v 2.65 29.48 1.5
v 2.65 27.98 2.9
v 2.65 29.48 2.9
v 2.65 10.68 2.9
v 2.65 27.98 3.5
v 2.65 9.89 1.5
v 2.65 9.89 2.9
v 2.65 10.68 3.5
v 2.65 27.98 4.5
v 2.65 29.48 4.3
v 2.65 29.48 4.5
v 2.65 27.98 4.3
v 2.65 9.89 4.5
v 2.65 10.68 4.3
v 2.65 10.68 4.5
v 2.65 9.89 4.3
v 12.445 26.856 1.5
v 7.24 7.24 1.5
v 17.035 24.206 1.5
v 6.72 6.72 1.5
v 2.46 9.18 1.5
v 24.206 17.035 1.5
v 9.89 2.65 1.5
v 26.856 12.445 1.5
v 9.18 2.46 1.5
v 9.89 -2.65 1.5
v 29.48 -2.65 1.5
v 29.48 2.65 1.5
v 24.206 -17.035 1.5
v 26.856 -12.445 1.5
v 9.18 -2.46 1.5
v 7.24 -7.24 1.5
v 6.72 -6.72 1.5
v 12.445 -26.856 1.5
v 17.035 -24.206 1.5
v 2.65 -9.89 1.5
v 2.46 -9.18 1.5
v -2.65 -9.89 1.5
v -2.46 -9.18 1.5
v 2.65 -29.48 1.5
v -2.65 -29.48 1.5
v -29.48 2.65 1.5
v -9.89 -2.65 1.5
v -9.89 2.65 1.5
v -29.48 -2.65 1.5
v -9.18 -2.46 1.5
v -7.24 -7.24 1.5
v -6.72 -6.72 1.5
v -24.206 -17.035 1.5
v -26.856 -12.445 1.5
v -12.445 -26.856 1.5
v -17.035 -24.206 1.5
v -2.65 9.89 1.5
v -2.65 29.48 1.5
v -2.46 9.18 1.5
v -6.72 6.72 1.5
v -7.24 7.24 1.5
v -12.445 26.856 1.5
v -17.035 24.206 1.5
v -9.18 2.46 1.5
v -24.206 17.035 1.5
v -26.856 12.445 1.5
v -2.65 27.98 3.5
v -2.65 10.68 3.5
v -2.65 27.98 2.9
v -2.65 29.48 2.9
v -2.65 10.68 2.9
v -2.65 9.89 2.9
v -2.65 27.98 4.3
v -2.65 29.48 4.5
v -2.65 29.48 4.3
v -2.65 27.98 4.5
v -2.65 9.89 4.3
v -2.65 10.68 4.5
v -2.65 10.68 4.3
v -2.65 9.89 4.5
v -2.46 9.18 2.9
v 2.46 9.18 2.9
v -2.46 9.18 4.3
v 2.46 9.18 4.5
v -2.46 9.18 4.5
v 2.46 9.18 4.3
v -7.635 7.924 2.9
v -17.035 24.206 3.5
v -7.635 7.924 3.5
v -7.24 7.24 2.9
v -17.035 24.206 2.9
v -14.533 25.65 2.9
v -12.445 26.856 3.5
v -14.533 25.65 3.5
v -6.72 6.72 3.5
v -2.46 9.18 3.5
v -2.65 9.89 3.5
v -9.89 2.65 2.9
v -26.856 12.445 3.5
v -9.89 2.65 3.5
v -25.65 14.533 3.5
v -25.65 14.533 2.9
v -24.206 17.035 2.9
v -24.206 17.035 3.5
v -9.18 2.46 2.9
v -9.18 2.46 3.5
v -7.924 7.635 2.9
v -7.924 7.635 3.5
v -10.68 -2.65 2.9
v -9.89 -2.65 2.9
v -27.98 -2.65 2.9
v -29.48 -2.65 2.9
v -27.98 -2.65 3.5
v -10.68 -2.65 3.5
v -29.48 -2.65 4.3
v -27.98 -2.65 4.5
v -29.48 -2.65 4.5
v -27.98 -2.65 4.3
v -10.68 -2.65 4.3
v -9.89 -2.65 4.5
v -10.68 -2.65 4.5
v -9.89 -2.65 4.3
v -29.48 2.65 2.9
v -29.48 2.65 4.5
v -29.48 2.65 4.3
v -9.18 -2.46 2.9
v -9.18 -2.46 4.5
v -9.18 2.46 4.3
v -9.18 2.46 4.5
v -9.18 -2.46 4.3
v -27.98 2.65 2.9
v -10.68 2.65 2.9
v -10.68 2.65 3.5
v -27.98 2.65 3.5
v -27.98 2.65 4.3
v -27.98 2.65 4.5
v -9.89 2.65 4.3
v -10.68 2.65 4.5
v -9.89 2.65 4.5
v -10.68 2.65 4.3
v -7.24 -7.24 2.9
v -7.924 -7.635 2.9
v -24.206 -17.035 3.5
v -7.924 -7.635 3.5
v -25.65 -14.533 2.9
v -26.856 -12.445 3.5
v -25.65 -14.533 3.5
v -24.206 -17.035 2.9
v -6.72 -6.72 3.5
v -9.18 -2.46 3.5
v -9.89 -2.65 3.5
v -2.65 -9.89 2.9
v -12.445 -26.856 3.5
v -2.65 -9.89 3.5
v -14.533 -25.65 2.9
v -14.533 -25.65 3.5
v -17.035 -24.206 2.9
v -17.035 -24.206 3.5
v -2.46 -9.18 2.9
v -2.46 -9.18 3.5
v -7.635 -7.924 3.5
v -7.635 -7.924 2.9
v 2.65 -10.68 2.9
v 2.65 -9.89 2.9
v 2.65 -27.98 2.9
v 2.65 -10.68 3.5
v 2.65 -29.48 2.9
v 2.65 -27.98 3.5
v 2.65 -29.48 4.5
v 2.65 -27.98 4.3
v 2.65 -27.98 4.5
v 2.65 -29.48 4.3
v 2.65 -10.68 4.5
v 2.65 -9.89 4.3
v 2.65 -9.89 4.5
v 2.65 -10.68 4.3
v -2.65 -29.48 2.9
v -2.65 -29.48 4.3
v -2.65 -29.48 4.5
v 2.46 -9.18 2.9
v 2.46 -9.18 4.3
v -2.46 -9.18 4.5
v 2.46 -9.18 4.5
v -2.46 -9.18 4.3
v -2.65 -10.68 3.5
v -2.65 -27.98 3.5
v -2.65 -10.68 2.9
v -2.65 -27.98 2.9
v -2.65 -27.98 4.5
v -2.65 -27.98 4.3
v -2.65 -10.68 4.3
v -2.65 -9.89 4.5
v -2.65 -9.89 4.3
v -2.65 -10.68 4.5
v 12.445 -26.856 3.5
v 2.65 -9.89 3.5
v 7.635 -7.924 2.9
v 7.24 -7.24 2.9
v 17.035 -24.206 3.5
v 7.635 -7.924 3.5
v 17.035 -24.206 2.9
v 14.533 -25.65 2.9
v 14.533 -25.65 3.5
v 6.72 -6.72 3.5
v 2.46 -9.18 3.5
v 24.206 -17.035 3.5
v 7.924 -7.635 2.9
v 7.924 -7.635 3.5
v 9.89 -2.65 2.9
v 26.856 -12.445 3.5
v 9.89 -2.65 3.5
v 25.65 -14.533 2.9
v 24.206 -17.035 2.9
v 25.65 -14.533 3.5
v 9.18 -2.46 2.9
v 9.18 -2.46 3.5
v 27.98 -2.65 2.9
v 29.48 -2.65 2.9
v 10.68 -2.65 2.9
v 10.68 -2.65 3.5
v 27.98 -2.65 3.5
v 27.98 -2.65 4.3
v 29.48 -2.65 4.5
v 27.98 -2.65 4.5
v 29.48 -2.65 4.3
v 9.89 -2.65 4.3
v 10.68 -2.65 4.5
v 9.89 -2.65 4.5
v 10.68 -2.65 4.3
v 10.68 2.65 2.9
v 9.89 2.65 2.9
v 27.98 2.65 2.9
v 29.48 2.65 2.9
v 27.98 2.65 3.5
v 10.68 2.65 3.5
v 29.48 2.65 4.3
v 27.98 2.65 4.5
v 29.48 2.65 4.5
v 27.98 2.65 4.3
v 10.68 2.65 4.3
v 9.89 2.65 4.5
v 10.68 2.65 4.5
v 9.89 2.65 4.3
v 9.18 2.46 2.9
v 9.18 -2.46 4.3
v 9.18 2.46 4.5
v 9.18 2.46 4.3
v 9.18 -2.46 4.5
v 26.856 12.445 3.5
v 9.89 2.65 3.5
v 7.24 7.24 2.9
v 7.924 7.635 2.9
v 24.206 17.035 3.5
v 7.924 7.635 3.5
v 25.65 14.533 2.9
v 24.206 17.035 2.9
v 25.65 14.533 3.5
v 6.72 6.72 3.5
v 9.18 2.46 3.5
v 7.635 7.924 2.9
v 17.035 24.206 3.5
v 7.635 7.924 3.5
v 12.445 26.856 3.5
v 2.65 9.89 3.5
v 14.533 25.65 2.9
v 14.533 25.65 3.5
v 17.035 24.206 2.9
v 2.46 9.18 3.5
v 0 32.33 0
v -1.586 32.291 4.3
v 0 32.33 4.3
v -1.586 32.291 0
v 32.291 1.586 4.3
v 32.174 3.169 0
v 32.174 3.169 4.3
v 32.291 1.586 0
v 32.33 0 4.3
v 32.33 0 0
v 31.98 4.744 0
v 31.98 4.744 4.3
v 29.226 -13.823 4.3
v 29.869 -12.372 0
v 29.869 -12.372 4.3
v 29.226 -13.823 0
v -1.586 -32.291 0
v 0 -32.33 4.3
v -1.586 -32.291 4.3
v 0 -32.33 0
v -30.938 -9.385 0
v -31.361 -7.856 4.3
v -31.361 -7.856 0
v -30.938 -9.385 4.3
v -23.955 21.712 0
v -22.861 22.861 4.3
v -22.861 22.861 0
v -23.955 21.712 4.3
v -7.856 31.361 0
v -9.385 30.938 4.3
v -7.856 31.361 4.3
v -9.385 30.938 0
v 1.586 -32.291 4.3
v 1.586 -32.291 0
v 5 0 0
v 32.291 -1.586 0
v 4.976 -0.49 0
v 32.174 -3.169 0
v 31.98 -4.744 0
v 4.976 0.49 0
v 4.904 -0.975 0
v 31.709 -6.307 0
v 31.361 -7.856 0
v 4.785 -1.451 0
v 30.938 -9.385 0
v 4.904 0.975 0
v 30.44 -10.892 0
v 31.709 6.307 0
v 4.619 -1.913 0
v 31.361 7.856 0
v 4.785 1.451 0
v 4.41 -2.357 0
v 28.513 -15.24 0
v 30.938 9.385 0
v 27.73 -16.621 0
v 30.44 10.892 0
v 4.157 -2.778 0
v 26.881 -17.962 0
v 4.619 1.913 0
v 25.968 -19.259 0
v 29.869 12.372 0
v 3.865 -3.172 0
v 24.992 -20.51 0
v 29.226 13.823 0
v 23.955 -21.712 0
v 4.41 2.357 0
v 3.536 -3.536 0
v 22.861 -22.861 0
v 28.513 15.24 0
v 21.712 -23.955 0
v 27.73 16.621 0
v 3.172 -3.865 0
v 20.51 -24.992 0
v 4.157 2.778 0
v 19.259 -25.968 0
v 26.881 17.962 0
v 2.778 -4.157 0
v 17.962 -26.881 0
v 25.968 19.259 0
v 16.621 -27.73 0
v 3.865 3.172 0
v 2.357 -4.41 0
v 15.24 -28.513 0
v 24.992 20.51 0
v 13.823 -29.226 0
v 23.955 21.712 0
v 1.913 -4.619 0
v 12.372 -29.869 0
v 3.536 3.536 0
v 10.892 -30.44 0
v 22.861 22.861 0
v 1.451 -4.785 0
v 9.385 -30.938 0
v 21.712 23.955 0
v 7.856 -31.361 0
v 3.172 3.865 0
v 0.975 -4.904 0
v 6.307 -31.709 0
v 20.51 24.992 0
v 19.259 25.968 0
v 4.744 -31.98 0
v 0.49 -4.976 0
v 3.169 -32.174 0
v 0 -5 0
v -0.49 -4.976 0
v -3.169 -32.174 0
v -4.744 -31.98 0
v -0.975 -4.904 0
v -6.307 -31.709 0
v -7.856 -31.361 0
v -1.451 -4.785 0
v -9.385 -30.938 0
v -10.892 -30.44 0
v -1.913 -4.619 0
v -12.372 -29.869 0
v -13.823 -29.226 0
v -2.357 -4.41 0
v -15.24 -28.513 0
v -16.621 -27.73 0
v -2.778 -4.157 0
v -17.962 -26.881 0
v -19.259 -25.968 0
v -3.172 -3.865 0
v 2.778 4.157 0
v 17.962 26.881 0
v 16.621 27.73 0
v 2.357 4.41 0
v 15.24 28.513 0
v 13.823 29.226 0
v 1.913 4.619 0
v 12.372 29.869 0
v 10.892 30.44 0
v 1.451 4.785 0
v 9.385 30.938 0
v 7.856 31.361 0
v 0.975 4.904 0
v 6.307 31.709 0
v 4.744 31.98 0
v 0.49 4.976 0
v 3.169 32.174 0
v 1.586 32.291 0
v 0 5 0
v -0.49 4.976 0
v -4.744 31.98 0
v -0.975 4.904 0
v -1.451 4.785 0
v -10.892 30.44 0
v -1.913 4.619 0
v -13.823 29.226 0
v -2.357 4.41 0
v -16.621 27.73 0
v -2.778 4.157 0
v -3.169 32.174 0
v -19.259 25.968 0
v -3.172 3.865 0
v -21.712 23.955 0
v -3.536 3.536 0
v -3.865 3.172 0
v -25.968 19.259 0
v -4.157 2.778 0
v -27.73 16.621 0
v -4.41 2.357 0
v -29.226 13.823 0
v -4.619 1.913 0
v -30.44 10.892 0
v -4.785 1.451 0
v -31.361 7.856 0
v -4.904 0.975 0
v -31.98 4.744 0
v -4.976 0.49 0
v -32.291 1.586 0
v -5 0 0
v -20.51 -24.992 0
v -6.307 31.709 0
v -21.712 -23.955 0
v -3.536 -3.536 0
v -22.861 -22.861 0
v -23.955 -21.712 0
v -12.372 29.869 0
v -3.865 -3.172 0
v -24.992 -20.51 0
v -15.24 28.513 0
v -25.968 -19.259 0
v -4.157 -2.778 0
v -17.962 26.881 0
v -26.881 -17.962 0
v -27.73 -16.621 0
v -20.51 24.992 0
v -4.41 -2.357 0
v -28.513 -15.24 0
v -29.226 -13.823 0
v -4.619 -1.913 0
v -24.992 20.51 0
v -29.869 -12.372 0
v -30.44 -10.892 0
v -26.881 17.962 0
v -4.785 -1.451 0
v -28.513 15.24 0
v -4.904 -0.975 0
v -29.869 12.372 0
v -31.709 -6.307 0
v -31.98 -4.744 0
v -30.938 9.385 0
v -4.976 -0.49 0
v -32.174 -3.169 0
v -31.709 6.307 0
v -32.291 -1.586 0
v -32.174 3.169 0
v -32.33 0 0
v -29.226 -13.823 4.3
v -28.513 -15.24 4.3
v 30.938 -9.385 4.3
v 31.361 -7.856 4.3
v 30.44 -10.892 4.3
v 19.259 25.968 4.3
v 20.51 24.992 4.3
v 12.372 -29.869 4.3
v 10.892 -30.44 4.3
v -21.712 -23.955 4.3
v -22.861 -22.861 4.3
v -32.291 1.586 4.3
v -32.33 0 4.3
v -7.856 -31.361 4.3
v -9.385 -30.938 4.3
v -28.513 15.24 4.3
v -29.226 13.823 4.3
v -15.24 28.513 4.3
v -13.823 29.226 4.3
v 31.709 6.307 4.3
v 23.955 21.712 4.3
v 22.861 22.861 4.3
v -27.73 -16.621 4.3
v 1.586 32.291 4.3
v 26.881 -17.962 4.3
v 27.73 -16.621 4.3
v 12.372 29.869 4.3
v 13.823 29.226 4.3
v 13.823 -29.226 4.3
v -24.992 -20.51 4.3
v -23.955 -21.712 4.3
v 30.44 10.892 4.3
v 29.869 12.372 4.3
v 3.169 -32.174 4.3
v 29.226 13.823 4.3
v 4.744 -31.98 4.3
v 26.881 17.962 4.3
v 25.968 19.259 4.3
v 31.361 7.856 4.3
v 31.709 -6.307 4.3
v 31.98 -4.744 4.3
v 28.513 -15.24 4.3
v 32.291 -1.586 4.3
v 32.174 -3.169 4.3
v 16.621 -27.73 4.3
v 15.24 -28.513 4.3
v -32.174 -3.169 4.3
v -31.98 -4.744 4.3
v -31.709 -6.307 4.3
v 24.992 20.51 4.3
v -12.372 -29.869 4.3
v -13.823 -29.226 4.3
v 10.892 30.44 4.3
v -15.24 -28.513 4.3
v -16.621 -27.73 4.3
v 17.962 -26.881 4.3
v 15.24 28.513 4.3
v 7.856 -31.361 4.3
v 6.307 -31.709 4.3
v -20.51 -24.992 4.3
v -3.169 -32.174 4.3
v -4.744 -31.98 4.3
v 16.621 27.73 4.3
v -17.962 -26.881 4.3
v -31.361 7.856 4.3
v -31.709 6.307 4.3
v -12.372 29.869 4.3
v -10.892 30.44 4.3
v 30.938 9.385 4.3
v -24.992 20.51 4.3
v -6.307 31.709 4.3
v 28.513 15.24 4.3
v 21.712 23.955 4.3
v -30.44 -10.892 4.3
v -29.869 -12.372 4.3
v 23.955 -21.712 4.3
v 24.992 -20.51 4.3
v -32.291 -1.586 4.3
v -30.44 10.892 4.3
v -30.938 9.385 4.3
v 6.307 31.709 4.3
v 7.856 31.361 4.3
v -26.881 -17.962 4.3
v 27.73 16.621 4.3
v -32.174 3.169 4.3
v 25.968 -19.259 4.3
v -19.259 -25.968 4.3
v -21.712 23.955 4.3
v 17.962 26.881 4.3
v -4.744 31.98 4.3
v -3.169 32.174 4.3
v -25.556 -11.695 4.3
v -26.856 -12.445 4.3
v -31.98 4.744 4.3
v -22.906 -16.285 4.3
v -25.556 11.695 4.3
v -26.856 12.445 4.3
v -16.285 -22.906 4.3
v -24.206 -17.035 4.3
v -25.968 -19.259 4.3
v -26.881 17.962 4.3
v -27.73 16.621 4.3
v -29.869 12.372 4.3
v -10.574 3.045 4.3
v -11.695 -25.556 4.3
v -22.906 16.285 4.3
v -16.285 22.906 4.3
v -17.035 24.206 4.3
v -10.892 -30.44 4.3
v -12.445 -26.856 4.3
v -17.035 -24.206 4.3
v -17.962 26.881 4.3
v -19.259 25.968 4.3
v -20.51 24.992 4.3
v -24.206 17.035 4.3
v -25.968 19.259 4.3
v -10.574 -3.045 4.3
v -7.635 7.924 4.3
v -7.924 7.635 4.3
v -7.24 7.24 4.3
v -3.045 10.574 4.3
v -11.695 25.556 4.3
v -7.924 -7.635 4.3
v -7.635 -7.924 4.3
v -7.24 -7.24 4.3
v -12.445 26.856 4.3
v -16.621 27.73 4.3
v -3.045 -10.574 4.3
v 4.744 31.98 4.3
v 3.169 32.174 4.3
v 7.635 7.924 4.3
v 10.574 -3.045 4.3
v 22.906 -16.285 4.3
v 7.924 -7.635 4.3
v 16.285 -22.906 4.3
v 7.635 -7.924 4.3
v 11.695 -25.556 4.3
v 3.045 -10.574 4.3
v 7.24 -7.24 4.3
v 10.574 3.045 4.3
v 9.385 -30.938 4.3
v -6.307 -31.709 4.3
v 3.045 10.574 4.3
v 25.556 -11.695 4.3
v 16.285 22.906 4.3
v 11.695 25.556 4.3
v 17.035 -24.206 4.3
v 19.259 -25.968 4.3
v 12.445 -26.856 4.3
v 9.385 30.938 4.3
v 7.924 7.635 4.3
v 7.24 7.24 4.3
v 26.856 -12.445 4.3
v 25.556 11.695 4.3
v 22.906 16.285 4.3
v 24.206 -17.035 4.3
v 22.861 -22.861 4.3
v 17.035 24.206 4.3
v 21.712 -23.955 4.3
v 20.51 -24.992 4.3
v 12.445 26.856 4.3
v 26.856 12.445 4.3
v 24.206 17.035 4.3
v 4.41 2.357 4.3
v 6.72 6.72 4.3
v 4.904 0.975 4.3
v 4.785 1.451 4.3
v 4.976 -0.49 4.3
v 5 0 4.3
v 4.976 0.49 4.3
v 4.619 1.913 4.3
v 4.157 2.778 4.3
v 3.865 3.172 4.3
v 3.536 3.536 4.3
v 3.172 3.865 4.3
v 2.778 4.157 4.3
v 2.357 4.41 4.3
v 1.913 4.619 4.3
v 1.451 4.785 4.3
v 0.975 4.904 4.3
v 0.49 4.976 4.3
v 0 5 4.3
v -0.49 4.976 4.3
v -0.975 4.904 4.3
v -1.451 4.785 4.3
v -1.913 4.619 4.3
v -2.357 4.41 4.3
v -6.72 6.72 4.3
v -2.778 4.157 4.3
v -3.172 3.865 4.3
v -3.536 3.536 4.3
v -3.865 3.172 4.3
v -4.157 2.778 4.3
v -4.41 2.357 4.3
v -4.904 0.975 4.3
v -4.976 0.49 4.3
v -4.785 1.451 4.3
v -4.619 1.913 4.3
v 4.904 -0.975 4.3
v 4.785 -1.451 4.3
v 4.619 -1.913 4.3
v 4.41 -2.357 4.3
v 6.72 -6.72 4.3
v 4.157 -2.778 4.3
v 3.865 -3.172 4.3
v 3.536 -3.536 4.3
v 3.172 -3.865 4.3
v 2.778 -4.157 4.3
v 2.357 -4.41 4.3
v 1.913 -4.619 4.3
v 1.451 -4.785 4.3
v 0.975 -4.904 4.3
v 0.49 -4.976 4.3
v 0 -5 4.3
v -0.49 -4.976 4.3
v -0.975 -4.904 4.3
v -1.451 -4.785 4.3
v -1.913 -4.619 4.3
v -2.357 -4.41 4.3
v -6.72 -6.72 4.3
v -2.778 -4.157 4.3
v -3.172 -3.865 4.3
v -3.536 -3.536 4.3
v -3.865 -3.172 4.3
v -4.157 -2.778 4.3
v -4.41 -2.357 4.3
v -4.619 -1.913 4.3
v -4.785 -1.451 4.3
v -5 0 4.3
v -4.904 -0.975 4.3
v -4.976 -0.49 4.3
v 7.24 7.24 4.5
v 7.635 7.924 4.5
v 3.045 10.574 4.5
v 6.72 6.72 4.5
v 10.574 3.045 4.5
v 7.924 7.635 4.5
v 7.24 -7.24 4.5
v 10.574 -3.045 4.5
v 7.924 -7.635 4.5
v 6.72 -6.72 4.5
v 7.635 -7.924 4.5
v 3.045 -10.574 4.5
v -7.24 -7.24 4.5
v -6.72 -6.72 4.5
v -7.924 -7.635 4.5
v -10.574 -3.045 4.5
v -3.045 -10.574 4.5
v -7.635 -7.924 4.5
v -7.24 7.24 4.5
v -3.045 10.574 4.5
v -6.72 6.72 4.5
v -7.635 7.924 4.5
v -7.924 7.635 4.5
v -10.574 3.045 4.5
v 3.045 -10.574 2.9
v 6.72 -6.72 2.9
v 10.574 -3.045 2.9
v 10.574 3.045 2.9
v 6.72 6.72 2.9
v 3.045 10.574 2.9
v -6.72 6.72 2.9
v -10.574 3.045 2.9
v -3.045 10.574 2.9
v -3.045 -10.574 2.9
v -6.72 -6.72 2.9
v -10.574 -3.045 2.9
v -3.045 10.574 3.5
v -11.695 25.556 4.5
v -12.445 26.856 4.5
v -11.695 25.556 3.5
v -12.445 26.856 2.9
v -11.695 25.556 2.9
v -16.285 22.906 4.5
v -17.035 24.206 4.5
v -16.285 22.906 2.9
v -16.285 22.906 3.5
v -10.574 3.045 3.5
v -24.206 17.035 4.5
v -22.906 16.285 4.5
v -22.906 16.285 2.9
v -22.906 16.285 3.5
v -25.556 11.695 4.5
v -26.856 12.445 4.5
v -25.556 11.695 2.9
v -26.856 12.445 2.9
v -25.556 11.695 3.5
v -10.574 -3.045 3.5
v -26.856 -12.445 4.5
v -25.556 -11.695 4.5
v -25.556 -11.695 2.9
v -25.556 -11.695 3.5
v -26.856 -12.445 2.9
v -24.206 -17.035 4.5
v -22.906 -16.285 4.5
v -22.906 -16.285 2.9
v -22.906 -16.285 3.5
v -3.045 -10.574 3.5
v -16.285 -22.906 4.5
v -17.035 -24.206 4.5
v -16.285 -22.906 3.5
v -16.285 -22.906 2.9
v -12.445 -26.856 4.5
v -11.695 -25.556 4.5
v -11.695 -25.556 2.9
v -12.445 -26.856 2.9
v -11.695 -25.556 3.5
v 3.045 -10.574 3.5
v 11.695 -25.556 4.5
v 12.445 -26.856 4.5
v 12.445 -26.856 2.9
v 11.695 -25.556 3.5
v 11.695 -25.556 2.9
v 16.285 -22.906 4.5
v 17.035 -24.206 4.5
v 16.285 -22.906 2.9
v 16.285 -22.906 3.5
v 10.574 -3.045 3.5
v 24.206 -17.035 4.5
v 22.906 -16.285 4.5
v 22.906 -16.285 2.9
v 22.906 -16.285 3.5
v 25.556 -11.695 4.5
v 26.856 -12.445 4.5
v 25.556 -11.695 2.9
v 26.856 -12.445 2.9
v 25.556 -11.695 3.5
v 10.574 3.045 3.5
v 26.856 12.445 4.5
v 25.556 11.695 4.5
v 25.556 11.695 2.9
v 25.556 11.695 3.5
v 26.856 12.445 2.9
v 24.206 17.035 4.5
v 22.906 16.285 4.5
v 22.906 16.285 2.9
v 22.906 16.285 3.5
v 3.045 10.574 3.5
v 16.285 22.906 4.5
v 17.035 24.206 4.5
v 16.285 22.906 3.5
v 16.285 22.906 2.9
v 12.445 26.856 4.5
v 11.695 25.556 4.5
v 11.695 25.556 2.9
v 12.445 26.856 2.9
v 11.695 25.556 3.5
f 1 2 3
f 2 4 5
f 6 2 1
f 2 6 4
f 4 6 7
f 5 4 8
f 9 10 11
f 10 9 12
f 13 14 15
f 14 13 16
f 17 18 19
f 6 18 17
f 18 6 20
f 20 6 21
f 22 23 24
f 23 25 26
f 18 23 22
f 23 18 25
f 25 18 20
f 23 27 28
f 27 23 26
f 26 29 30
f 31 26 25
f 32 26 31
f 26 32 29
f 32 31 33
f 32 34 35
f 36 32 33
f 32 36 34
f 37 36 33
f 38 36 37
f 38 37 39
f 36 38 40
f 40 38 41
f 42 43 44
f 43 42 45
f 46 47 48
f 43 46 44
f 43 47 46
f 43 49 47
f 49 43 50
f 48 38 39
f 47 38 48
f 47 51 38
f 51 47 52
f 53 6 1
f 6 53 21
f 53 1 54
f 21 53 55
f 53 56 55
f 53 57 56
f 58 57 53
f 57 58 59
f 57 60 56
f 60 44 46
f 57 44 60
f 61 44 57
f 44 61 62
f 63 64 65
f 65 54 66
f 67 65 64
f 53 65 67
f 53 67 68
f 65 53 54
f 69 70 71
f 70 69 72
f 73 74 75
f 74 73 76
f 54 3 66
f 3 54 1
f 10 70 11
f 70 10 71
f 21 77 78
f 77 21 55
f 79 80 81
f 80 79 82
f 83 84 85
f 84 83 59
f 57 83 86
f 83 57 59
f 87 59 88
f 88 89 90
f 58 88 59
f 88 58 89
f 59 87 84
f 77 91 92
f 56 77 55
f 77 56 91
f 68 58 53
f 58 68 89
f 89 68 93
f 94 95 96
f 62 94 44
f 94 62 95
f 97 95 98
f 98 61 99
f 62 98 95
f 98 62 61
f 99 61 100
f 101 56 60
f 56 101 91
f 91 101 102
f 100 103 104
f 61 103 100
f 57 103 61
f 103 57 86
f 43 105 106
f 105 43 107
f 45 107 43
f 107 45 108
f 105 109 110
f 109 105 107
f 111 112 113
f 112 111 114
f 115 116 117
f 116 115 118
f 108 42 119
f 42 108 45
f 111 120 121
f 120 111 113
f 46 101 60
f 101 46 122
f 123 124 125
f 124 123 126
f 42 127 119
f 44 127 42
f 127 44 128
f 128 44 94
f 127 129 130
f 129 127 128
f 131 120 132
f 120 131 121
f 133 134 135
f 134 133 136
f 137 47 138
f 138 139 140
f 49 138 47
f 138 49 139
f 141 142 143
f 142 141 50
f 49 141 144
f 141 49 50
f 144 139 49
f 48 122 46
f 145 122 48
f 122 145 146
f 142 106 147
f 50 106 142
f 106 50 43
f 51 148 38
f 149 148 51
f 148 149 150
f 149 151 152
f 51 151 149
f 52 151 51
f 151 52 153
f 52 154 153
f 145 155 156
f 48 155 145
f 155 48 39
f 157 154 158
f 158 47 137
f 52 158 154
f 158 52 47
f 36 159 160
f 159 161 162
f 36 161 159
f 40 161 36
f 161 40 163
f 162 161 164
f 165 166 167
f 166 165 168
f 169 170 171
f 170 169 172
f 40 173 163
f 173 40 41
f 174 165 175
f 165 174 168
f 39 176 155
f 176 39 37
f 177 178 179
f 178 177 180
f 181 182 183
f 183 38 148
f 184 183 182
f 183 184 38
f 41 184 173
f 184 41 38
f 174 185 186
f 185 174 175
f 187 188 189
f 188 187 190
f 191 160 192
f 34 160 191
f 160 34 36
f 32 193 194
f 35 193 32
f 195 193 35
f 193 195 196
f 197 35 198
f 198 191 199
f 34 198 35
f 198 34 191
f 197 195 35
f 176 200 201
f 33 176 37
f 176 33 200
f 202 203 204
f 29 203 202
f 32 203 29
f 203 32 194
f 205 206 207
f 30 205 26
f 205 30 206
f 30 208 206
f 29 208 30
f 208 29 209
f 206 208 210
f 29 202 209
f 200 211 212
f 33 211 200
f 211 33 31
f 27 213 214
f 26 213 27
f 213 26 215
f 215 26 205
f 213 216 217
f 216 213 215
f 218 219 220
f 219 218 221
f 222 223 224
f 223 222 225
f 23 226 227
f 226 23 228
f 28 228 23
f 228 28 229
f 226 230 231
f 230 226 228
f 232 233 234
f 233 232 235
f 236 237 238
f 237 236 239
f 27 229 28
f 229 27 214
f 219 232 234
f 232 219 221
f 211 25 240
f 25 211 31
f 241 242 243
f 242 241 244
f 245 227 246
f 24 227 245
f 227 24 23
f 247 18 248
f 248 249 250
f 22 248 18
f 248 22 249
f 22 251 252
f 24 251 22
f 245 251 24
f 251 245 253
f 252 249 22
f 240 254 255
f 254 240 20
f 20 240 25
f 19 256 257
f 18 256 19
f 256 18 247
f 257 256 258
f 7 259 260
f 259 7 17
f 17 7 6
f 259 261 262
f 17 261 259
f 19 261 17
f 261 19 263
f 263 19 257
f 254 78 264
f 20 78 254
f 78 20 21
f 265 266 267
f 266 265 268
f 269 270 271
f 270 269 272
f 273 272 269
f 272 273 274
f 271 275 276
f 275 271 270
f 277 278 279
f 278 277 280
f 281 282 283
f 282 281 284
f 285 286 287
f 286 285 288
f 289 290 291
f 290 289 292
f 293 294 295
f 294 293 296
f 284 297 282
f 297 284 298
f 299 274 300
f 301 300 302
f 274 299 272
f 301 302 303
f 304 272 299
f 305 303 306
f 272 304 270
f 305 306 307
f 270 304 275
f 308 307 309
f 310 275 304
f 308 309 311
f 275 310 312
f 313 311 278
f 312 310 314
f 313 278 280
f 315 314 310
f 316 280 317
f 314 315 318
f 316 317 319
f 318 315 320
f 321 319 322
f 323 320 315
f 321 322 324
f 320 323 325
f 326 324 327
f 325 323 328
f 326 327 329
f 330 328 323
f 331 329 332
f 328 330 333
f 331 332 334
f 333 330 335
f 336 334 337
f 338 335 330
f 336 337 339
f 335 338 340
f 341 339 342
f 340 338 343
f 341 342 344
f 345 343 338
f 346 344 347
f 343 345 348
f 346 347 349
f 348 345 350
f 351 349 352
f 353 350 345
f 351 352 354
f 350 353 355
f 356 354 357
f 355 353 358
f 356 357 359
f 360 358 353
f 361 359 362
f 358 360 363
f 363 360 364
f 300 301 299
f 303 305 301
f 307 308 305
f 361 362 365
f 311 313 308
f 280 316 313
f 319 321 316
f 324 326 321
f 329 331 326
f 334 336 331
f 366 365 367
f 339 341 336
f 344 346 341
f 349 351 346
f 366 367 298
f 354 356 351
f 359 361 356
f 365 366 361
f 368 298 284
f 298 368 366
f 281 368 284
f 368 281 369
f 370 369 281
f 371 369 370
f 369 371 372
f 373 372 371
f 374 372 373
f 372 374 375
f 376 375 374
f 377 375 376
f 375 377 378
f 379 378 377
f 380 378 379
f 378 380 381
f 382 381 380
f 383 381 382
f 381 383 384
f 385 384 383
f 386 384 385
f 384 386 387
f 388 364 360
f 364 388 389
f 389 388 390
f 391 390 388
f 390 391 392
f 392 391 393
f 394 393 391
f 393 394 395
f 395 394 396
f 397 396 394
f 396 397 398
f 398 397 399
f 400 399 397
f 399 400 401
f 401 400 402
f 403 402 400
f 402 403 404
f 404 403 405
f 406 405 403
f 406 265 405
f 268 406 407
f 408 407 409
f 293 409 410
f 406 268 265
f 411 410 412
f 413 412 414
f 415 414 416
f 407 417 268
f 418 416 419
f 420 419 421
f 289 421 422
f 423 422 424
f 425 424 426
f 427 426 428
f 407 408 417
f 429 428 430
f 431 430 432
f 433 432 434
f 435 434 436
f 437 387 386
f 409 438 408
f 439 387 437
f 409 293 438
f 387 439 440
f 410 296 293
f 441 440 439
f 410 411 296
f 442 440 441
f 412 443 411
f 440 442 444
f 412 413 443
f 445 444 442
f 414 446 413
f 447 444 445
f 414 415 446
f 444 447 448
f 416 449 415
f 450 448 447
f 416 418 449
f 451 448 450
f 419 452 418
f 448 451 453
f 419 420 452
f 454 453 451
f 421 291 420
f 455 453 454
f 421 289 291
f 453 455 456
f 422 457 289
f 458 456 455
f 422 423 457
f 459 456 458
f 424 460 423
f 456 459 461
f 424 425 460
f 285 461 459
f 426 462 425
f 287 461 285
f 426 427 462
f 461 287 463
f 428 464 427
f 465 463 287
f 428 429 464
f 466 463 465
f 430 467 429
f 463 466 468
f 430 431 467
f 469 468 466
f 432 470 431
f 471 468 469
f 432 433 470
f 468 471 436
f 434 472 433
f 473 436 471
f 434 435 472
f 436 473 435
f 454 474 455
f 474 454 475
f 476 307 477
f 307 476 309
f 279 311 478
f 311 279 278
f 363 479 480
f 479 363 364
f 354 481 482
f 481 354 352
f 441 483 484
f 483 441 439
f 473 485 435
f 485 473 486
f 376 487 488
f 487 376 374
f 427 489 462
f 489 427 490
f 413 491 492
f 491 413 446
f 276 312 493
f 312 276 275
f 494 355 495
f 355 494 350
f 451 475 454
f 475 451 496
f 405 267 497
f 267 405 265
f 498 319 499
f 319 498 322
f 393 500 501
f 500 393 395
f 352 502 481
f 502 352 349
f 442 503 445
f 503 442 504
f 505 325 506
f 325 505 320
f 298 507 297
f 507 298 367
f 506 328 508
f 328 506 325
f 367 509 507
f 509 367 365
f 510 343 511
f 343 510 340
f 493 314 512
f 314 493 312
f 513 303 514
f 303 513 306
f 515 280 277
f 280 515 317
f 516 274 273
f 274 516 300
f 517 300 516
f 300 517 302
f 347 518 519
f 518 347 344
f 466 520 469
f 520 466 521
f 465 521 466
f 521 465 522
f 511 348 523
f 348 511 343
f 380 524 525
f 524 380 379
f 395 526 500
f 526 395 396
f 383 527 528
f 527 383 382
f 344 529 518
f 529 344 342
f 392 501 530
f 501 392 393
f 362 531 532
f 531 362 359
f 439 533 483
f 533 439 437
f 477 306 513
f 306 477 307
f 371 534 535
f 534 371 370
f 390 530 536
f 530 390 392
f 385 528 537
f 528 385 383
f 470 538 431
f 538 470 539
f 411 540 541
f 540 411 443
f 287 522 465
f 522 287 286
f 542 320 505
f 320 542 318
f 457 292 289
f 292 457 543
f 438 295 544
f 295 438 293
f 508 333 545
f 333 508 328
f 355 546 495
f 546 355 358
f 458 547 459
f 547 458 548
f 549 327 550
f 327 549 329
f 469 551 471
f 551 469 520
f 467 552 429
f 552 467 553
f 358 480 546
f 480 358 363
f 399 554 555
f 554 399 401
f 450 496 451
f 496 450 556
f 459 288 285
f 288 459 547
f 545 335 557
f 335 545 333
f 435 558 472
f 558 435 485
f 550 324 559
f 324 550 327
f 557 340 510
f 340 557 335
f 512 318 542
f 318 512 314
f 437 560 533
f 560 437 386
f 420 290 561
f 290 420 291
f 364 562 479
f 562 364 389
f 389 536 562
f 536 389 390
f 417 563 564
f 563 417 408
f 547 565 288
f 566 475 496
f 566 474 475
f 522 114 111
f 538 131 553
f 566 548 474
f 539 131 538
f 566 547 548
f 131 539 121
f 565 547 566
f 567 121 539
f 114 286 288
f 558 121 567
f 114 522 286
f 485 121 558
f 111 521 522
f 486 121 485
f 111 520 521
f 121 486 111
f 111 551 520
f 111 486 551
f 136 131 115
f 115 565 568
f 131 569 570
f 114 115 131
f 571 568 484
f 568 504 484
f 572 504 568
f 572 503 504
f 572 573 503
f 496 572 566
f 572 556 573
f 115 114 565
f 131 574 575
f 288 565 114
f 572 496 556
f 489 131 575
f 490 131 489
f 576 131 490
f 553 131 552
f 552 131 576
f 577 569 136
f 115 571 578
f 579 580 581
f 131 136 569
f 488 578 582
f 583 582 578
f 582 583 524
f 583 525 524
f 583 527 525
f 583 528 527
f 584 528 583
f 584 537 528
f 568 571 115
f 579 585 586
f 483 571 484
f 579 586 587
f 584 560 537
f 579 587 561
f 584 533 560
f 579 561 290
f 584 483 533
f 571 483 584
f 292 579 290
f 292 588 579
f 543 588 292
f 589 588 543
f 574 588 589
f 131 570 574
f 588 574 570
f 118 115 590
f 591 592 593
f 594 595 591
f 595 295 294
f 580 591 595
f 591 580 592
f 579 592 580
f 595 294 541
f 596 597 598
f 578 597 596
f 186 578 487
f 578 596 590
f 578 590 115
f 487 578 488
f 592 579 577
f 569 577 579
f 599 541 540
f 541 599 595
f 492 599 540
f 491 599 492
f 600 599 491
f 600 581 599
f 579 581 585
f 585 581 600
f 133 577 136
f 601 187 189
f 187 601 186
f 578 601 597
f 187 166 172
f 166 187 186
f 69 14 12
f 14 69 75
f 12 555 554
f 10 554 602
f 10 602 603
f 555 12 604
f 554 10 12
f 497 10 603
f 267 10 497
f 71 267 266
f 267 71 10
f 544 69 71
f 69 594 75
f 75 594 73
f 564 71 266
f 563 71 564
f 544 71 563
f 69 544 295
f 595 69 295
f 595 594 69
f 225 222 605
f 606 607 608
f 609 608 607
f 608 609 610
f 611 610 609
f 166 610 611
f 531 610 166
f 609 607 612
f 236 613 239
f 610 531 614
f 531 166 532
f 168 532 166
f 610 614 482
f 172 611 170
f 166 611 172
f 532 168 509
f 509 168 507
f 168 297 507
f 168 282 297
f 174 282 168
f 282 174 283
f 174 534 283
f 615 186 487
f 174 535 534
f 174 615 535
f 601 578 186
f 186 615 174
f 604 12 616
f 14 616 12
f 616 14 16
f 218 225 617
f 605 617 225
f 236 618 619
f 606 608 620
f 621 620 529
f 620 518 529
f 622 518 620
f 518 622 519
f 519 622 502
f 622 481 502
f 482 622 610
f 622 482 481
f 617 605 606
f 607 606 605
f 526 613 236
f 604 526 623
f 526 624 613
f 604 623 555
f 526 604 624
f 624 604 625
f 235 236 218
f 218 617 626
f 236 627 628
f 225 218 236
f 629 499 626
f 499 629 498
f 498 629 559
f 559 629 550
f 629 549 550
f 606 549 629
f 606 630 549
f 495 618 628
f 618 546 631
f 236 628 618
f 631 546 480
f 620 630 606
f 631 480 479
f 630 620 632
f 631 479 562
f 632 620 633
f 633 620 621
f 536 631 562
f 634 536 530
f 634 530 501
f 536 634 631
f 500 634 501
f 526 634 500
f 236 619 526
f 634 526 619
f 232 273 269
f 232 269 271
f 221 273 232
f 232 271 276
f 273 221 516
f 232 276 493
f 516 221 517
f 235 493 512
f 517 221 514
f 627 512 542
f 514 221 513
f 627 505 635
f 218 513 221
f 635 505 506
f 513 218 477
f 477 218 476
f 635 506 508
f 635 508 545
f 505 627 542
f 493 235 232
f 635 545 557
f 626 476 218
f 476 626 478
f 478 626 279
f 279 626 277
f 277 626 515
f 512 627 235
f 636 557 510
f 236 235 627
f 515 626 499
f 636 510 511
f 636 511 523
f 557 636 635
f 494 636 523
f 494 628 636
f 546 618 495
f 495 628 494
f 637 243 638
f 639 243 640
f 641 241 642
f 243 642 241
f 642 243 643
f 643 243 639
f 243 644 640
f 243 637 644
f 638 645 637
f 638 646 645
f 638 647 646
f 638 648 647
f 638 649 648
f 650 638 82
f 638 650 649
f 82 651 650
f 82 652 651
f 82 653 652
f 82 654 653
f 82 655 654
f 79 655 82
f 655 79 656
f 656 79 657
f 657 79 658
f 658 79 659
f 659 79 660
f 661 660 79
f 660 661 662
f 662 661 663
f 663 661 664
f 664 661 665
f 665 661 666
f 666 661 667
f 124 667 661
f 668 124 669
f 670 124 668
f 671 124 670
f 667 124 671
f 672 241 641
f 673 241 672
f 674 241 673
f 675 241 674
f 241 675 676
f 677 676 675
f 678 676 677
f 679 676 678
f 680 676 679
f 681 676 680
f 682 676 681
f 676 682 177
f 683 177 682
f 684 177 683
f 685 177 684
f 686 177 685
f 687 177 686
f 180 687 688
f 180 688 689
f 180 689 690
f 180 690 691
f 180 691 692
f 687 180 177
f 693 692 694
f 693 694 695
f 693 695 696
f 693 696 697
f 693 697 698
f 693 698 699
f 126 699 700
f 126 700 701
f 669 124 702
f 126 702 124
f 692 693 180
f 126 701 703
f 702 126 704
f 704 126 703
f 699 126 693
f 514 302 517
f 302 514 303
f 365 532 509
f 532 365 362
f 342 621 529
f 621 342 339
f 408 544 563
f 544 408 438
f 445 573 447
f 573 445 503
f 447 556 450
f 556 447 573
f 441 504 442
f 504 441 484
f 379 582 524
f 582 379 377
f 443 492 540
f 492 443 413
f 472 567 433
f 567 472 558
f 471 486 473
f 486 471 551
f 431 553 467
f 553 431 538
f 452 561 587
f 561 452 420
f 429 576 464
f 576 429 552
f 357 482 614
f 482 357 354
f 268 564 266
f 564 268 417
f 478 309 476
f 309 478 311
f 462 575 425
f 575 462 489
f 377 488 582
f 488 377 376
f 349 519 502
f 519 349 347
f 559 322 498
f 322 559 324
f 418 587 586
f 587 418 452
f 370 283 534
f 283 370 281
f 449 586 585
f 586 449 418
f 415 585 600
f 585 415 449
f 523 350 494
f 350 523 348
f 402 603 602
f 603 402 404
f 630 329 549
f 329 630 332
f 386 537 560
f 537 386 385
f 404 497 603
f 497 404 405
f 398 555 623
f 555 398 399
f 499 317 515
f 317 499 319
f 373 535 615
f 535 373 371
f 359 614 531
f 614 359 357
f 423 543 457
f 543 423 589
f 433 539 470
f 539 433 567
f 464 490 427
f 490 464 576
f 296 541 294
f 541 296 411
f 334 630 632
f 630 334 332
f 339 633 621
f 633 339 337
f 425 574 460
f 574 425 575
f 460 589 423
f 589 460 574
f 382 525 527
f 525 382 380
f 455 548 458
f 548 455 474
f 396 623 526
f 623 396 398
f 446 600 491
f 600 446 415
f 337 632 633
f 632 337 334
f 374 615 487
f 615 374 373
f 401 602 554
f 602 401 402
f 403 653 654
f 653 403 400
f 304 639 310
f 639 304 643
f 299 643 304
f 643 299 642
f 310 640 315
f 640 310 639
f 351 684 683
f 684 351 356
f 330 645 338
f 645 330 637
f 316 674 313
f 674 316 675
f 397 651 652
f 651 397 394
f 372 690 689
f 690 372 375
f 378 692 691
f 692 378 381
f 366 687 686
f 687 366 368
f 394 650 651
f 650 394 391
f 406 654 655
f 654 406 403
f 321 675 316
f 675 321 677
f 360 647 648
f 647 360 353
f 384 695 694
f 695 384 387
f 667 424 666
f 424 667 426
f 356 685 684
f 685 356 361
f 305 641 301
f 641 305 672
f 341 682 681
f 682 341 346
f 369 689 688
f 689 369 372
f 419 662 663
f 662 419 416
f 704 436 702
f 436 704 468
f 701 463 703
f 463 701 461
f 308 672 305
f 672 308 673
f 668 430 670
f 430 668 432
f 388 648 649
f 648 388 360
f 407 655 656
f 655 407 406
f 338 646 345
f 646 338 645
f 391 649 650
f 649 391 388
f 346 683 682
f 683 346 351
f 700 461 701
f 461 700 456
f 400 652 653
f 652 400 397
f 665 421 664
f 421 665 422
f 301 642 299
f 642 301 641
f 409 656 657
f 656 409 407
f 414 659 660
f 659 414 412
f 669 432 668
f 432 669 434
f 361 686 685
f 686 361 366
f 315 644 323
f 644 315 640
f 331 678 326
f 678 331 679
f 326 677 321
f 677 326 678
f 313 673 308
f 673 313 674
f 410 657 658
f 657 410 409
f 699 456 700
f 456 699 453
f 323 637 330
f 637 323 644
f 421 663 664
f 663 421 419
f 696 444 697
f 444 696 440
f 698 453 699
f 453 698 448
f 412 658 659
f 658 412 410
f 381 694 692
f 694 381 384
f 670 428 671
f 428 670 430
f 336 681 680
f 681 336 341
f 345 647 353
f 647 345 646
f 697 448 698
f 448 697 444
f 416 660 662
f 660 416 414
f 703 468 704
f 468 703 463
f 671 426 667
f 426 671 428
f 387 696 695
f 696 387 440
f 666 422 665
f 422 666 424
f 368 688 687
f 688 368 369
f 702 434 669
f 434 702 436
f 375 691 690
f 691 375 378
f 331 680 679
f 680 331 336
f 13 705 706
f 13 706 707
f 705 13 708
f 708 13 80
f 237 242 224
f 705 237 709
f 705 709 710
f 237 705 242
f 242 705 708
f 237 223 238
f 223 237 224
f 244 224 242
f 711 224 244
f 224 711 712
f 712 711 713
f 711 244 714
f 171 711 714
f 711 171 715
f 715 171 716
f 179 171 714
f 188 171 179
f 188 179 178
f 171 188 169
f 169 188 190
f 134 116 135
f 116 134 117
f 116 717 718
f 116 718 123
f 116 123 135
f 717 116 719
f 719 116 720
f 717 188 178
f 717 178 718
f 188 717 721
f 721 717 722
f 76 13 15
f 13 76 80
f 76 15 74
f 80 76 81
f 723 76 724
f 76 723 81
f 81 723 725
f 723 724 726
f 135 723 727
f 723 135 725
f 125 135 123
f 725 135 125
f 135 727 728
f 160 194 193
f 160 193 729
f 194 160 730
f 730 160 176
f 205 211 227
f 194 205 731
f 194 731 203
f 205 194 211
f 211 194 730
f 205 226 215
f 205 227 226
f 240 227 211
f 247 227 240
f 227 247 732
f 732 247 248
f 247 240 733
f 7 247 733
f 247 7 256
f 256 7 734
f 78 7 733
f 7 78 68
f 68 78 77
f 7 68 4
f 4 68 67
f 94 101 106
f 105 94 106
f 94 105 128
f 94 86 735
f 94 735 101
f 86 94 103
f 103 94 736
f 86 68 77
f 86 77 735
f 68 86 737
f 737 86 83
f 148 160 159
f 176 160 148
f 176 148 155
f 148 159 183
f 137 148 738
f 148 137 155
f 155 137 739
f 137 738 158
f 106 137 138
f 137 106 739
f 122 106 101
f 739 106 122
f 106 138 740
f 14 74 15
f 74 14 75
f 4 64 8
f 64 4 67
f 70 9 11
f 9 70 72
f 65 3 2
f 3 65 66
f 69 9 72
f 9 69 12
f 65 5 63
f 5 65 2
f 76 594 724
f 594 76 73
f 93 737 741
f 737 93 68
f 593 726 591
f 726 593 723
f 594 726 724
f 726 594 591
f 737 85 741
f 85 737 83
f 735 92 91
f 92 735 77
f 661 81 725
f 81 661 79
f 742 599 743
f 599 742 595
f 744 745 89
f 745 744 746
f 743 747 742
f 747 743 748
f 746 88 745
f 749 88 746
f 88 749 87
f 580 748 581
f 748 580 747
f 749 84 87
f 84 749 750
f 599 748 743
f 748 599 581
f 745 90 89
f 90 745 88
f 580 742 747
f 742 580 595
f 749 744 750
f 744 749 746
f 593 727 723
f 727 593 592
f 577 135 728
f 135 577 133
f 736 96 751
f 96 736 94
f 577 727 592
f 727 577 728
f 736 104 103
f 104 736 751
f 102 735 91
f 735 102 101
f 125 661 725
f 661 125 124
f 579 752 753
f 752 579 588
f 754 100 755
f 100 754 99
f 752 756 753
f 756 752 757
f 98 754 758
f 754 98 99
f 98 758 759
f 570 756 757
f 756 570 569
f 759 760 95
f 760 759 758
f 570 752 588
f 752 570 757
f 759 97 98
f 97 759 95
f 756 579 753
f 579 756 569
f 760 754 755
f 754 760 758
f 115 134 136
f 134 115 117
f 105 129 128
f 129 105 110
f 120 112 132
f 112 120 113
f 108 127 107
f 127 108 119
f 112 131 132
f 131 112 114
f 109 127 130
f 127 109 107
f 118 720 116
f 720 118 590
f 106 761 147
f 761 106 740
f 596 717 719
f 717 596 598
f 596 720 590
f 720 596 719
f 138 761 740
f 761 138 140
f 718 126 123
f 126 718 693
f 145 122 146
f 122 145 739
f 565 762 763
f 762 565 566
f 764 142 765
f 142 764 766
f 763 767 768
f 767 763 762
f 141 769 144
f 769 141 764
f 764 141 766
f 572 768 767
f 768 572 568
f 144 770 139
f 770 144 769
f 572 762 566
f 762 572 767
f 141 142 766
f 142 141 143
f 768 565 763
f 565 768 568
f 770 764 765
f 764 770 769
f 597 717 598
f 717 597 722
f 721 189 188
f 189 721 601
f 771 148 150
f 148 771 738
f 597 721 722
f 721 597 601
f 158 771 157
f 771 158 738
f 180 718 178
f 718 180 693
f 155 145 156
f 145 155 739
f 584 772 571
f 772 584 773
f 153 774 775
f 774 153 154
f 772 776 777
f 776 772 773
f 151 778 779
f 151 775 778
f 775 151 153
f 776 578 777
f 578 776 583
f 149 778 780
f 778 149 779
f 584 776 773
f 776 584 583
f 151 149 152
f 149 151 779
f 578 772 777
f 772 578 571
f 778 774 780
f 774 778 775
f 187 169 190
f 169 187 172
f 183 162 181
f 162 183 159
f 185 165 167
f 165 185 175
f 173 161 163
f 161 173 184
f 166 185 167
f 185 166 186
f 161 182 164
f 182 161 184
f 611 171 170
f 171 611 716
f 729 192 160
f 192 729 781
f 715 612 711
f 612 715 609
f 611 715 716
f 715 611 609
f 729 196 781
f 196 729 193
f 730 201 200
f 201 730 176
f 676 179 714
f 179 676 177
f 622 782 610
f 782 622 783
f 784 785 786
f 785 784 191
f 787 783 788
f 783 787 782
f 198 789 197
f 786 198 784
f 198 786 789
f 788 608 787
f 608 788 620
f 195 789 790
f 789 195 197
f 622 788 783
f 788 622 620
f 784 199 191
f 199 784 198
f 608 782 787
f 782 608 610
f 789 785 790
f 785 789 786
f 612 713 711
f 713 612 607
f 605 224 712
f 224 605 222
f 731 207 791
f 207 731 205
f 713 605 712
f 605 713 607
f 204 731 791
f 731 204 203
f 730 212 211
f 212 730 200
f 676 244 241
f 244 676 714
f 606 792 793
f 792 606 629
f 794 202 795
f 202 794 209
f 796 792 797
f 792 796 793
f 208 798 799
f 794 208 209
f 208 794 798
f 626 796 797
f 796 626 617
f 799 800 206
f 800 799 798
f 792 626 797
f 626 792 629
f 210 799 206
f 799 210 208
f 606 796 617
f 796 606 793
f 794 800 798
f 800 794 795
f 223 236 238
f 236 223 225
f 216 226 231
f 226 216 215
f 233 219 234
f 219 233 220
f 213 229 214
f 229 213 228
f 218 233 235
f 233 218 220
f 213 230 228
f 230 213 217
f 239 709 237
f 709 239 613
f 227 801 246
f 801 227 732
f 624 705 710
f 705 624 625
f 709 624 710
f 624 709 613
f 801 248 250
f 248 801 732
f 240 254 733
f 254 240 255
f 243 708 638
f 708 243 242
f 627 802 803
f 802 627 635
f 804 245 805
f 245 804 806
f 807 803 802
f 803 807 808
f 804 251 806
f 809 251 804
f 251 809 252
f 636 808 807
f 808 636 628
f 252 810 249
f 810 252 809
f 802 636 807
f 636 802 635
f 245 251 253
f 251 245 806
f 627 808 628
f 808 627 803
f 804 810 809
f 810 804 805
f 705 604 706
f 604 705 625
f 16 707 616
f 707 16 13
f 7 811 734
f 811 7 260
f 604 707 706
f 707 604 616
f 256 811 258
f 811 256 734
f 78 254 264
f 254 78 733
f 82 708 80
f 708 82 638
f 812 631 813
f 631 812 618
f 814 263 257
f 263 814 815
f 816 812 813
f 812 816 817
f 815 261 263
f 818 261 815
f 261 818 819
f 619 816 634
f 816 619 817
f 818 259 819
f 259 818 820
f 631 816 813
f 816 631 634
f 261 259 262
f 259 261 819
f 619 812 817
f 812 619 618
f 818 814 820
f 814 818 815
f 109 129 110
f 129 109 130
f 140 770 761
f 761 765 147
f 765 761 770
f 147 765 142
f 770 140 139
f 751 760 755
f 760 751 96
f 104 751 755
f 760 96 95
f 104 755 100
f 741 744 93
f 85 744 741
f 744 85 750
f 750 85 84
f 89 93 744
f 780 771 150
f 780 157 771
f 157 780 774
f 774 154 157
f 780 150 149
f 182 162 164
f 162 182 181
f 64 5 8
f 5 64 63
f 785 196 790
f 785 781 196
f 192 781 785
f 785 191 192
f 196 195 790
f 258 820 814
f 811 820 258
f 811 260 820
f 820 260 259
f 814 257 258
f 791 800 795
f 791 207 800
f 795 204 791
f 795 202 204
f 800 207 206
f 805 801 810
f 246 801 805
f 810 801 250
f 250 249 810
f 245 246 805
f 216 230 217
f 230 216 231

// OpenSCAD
// =============================================================================
//  Encoder Wheel Frame
//  Generated by generate_3d.py — do not edit by hand; re-run the script.
// =============================================================================
//
//  Render with F6 in OpenSCAD, then File → Export → STL.
//  Requires OpenSCAD 2021.01 or later.
//
//  Coordinate system
//  -----------------
//    Z = wheel axis (print flat on Z = 0 plane)
//    XY = wheel face
//

// ---- Geometry parameters ----------------------------------------
n_magnets       = 12;       // number of magnets
angle_step      = 30.000000; // degrees between magnets
magnet_length   = 20.0;    // radial length (mm)
magnet_width    = 5.0;     // tangential width (mm)
magnet_thick    = 2.0;     // axial thickness (mm)
r_inner         = 9.3301;  // inner radius (mm)
r_outer         = 29.3301;  // outer radius (mm)
r_frame         = 32.3301;  // frame outer radius (mm)
center_bore     = 5.0;     // shaft bore radius (mm)
clearance       = 0.15;    // per-side pocket clearance (mm)

// ---- Pocket dimensions ----------------------------------------
pw              = 5.3;   // pocket width  (tangential)
pl              = 20.3;   // pocket length (radial)
pd              = 2.0;       // pocket depth  (axial)
r_pkt           = 9.1801;  // pocket inner-edge radius

back_thickness  = 1.5;    // back plate thickness (mm)
front_thickness = 0.8;    // front face thickness (mm)
tab_width       = 1.5;    // retaining tab radial width (mm)
tab_overhang    = 0.6;    // retaining tab overhang (mm)

z_back          = 1.5;    // Z of pocket floor
z_top_magnet    = 3.500;  // Z of pocket opening / magnet top
total_height    = 4.300;  // overall frame height

// ====================================================================
// Module: magnet_pocket()
// One magnet slot, open at the top face (+Z).
// In local coords: +Y = radial outward, +X = tangential CCW, +Z = axial.
// The pocket inner edge sits at r_pkt (slightly inside r_inner).
// ====================================================================
module magnet_pocket() {
    translate([-pw/2, 9.1801, 1.500])
        cube([pw, pl, pd + 1]);  // +1 ensures clean exit through top face
}

// ====================================================================
// Module: retaining_tabs()
// Two small lips at the inner and outer radial ends of the pocket
// opening.  They overhang the pocket so magnets snap in from above.
// Print with the pocket face upward so these bridge the gap.
// ====================================================================
module retaining_tabs() {
    // Inner-radial tab
    translate([-pw/2, 9.1801, 2.9000])
        cube([pw, 1.5, 1.6]);  // +1 = above face
    // Outer-radial tab
    translate([-pw/2, 27.9801, 2.9000])
        cube([pw, 1.5, 1.6]);
}

// ====================================================================
// Module: front_face_ring()
// Thin solid skin over the magnet pockets (smooth sensing surface).
// ====================================================================
module front_face_ring() {
    difference() {
        translate([0, 0, 3.500])
            cylinder(h = 0.8, r = r_frame, $fn = 128);
        cylinder(h = total_height * 3, r = center_bore, center = true, $fn = 64);
    }
}

// ====================================================================
// Module: encoder_wheel()
// Complete encoder wheel frame — subtract pockets then optionally add
// tabs, front face, and/or steel clip slots.
// ====================================================================
module encoder_wheel() {
    union() {

        // -- Main body: outer ring + (optional) back disc --
        difference() {

            // Solid disc from z=0 to z=total_height
            cylinder(h = 4.300, r = r_frame, $fn = 128);

            // Central shaft bore
            cylinder(h = 4.300 * 3, r = center_bore, center = true, $fn = 64);


            // Magnet pockets
            for (i = [0 : n_magnets - 1]) {
                rotate([0, 0, i * angle_step])
                    magnet_pocket();
            }

        }  // end difference

        // -- Retaining tabs (overhang over pocket openings) --
        for (i = [0 : n_magnets - 1]) {
            rotate([0, 0, i * angle_step])
                retaining_tabs();
        }

        // -- Smooth front face --
        front_face_ring();

    }  // end union
}  // end encoder_wheel

// ====================================================================
// Render the wheel
// ====================================================================
encoder_wheel();
